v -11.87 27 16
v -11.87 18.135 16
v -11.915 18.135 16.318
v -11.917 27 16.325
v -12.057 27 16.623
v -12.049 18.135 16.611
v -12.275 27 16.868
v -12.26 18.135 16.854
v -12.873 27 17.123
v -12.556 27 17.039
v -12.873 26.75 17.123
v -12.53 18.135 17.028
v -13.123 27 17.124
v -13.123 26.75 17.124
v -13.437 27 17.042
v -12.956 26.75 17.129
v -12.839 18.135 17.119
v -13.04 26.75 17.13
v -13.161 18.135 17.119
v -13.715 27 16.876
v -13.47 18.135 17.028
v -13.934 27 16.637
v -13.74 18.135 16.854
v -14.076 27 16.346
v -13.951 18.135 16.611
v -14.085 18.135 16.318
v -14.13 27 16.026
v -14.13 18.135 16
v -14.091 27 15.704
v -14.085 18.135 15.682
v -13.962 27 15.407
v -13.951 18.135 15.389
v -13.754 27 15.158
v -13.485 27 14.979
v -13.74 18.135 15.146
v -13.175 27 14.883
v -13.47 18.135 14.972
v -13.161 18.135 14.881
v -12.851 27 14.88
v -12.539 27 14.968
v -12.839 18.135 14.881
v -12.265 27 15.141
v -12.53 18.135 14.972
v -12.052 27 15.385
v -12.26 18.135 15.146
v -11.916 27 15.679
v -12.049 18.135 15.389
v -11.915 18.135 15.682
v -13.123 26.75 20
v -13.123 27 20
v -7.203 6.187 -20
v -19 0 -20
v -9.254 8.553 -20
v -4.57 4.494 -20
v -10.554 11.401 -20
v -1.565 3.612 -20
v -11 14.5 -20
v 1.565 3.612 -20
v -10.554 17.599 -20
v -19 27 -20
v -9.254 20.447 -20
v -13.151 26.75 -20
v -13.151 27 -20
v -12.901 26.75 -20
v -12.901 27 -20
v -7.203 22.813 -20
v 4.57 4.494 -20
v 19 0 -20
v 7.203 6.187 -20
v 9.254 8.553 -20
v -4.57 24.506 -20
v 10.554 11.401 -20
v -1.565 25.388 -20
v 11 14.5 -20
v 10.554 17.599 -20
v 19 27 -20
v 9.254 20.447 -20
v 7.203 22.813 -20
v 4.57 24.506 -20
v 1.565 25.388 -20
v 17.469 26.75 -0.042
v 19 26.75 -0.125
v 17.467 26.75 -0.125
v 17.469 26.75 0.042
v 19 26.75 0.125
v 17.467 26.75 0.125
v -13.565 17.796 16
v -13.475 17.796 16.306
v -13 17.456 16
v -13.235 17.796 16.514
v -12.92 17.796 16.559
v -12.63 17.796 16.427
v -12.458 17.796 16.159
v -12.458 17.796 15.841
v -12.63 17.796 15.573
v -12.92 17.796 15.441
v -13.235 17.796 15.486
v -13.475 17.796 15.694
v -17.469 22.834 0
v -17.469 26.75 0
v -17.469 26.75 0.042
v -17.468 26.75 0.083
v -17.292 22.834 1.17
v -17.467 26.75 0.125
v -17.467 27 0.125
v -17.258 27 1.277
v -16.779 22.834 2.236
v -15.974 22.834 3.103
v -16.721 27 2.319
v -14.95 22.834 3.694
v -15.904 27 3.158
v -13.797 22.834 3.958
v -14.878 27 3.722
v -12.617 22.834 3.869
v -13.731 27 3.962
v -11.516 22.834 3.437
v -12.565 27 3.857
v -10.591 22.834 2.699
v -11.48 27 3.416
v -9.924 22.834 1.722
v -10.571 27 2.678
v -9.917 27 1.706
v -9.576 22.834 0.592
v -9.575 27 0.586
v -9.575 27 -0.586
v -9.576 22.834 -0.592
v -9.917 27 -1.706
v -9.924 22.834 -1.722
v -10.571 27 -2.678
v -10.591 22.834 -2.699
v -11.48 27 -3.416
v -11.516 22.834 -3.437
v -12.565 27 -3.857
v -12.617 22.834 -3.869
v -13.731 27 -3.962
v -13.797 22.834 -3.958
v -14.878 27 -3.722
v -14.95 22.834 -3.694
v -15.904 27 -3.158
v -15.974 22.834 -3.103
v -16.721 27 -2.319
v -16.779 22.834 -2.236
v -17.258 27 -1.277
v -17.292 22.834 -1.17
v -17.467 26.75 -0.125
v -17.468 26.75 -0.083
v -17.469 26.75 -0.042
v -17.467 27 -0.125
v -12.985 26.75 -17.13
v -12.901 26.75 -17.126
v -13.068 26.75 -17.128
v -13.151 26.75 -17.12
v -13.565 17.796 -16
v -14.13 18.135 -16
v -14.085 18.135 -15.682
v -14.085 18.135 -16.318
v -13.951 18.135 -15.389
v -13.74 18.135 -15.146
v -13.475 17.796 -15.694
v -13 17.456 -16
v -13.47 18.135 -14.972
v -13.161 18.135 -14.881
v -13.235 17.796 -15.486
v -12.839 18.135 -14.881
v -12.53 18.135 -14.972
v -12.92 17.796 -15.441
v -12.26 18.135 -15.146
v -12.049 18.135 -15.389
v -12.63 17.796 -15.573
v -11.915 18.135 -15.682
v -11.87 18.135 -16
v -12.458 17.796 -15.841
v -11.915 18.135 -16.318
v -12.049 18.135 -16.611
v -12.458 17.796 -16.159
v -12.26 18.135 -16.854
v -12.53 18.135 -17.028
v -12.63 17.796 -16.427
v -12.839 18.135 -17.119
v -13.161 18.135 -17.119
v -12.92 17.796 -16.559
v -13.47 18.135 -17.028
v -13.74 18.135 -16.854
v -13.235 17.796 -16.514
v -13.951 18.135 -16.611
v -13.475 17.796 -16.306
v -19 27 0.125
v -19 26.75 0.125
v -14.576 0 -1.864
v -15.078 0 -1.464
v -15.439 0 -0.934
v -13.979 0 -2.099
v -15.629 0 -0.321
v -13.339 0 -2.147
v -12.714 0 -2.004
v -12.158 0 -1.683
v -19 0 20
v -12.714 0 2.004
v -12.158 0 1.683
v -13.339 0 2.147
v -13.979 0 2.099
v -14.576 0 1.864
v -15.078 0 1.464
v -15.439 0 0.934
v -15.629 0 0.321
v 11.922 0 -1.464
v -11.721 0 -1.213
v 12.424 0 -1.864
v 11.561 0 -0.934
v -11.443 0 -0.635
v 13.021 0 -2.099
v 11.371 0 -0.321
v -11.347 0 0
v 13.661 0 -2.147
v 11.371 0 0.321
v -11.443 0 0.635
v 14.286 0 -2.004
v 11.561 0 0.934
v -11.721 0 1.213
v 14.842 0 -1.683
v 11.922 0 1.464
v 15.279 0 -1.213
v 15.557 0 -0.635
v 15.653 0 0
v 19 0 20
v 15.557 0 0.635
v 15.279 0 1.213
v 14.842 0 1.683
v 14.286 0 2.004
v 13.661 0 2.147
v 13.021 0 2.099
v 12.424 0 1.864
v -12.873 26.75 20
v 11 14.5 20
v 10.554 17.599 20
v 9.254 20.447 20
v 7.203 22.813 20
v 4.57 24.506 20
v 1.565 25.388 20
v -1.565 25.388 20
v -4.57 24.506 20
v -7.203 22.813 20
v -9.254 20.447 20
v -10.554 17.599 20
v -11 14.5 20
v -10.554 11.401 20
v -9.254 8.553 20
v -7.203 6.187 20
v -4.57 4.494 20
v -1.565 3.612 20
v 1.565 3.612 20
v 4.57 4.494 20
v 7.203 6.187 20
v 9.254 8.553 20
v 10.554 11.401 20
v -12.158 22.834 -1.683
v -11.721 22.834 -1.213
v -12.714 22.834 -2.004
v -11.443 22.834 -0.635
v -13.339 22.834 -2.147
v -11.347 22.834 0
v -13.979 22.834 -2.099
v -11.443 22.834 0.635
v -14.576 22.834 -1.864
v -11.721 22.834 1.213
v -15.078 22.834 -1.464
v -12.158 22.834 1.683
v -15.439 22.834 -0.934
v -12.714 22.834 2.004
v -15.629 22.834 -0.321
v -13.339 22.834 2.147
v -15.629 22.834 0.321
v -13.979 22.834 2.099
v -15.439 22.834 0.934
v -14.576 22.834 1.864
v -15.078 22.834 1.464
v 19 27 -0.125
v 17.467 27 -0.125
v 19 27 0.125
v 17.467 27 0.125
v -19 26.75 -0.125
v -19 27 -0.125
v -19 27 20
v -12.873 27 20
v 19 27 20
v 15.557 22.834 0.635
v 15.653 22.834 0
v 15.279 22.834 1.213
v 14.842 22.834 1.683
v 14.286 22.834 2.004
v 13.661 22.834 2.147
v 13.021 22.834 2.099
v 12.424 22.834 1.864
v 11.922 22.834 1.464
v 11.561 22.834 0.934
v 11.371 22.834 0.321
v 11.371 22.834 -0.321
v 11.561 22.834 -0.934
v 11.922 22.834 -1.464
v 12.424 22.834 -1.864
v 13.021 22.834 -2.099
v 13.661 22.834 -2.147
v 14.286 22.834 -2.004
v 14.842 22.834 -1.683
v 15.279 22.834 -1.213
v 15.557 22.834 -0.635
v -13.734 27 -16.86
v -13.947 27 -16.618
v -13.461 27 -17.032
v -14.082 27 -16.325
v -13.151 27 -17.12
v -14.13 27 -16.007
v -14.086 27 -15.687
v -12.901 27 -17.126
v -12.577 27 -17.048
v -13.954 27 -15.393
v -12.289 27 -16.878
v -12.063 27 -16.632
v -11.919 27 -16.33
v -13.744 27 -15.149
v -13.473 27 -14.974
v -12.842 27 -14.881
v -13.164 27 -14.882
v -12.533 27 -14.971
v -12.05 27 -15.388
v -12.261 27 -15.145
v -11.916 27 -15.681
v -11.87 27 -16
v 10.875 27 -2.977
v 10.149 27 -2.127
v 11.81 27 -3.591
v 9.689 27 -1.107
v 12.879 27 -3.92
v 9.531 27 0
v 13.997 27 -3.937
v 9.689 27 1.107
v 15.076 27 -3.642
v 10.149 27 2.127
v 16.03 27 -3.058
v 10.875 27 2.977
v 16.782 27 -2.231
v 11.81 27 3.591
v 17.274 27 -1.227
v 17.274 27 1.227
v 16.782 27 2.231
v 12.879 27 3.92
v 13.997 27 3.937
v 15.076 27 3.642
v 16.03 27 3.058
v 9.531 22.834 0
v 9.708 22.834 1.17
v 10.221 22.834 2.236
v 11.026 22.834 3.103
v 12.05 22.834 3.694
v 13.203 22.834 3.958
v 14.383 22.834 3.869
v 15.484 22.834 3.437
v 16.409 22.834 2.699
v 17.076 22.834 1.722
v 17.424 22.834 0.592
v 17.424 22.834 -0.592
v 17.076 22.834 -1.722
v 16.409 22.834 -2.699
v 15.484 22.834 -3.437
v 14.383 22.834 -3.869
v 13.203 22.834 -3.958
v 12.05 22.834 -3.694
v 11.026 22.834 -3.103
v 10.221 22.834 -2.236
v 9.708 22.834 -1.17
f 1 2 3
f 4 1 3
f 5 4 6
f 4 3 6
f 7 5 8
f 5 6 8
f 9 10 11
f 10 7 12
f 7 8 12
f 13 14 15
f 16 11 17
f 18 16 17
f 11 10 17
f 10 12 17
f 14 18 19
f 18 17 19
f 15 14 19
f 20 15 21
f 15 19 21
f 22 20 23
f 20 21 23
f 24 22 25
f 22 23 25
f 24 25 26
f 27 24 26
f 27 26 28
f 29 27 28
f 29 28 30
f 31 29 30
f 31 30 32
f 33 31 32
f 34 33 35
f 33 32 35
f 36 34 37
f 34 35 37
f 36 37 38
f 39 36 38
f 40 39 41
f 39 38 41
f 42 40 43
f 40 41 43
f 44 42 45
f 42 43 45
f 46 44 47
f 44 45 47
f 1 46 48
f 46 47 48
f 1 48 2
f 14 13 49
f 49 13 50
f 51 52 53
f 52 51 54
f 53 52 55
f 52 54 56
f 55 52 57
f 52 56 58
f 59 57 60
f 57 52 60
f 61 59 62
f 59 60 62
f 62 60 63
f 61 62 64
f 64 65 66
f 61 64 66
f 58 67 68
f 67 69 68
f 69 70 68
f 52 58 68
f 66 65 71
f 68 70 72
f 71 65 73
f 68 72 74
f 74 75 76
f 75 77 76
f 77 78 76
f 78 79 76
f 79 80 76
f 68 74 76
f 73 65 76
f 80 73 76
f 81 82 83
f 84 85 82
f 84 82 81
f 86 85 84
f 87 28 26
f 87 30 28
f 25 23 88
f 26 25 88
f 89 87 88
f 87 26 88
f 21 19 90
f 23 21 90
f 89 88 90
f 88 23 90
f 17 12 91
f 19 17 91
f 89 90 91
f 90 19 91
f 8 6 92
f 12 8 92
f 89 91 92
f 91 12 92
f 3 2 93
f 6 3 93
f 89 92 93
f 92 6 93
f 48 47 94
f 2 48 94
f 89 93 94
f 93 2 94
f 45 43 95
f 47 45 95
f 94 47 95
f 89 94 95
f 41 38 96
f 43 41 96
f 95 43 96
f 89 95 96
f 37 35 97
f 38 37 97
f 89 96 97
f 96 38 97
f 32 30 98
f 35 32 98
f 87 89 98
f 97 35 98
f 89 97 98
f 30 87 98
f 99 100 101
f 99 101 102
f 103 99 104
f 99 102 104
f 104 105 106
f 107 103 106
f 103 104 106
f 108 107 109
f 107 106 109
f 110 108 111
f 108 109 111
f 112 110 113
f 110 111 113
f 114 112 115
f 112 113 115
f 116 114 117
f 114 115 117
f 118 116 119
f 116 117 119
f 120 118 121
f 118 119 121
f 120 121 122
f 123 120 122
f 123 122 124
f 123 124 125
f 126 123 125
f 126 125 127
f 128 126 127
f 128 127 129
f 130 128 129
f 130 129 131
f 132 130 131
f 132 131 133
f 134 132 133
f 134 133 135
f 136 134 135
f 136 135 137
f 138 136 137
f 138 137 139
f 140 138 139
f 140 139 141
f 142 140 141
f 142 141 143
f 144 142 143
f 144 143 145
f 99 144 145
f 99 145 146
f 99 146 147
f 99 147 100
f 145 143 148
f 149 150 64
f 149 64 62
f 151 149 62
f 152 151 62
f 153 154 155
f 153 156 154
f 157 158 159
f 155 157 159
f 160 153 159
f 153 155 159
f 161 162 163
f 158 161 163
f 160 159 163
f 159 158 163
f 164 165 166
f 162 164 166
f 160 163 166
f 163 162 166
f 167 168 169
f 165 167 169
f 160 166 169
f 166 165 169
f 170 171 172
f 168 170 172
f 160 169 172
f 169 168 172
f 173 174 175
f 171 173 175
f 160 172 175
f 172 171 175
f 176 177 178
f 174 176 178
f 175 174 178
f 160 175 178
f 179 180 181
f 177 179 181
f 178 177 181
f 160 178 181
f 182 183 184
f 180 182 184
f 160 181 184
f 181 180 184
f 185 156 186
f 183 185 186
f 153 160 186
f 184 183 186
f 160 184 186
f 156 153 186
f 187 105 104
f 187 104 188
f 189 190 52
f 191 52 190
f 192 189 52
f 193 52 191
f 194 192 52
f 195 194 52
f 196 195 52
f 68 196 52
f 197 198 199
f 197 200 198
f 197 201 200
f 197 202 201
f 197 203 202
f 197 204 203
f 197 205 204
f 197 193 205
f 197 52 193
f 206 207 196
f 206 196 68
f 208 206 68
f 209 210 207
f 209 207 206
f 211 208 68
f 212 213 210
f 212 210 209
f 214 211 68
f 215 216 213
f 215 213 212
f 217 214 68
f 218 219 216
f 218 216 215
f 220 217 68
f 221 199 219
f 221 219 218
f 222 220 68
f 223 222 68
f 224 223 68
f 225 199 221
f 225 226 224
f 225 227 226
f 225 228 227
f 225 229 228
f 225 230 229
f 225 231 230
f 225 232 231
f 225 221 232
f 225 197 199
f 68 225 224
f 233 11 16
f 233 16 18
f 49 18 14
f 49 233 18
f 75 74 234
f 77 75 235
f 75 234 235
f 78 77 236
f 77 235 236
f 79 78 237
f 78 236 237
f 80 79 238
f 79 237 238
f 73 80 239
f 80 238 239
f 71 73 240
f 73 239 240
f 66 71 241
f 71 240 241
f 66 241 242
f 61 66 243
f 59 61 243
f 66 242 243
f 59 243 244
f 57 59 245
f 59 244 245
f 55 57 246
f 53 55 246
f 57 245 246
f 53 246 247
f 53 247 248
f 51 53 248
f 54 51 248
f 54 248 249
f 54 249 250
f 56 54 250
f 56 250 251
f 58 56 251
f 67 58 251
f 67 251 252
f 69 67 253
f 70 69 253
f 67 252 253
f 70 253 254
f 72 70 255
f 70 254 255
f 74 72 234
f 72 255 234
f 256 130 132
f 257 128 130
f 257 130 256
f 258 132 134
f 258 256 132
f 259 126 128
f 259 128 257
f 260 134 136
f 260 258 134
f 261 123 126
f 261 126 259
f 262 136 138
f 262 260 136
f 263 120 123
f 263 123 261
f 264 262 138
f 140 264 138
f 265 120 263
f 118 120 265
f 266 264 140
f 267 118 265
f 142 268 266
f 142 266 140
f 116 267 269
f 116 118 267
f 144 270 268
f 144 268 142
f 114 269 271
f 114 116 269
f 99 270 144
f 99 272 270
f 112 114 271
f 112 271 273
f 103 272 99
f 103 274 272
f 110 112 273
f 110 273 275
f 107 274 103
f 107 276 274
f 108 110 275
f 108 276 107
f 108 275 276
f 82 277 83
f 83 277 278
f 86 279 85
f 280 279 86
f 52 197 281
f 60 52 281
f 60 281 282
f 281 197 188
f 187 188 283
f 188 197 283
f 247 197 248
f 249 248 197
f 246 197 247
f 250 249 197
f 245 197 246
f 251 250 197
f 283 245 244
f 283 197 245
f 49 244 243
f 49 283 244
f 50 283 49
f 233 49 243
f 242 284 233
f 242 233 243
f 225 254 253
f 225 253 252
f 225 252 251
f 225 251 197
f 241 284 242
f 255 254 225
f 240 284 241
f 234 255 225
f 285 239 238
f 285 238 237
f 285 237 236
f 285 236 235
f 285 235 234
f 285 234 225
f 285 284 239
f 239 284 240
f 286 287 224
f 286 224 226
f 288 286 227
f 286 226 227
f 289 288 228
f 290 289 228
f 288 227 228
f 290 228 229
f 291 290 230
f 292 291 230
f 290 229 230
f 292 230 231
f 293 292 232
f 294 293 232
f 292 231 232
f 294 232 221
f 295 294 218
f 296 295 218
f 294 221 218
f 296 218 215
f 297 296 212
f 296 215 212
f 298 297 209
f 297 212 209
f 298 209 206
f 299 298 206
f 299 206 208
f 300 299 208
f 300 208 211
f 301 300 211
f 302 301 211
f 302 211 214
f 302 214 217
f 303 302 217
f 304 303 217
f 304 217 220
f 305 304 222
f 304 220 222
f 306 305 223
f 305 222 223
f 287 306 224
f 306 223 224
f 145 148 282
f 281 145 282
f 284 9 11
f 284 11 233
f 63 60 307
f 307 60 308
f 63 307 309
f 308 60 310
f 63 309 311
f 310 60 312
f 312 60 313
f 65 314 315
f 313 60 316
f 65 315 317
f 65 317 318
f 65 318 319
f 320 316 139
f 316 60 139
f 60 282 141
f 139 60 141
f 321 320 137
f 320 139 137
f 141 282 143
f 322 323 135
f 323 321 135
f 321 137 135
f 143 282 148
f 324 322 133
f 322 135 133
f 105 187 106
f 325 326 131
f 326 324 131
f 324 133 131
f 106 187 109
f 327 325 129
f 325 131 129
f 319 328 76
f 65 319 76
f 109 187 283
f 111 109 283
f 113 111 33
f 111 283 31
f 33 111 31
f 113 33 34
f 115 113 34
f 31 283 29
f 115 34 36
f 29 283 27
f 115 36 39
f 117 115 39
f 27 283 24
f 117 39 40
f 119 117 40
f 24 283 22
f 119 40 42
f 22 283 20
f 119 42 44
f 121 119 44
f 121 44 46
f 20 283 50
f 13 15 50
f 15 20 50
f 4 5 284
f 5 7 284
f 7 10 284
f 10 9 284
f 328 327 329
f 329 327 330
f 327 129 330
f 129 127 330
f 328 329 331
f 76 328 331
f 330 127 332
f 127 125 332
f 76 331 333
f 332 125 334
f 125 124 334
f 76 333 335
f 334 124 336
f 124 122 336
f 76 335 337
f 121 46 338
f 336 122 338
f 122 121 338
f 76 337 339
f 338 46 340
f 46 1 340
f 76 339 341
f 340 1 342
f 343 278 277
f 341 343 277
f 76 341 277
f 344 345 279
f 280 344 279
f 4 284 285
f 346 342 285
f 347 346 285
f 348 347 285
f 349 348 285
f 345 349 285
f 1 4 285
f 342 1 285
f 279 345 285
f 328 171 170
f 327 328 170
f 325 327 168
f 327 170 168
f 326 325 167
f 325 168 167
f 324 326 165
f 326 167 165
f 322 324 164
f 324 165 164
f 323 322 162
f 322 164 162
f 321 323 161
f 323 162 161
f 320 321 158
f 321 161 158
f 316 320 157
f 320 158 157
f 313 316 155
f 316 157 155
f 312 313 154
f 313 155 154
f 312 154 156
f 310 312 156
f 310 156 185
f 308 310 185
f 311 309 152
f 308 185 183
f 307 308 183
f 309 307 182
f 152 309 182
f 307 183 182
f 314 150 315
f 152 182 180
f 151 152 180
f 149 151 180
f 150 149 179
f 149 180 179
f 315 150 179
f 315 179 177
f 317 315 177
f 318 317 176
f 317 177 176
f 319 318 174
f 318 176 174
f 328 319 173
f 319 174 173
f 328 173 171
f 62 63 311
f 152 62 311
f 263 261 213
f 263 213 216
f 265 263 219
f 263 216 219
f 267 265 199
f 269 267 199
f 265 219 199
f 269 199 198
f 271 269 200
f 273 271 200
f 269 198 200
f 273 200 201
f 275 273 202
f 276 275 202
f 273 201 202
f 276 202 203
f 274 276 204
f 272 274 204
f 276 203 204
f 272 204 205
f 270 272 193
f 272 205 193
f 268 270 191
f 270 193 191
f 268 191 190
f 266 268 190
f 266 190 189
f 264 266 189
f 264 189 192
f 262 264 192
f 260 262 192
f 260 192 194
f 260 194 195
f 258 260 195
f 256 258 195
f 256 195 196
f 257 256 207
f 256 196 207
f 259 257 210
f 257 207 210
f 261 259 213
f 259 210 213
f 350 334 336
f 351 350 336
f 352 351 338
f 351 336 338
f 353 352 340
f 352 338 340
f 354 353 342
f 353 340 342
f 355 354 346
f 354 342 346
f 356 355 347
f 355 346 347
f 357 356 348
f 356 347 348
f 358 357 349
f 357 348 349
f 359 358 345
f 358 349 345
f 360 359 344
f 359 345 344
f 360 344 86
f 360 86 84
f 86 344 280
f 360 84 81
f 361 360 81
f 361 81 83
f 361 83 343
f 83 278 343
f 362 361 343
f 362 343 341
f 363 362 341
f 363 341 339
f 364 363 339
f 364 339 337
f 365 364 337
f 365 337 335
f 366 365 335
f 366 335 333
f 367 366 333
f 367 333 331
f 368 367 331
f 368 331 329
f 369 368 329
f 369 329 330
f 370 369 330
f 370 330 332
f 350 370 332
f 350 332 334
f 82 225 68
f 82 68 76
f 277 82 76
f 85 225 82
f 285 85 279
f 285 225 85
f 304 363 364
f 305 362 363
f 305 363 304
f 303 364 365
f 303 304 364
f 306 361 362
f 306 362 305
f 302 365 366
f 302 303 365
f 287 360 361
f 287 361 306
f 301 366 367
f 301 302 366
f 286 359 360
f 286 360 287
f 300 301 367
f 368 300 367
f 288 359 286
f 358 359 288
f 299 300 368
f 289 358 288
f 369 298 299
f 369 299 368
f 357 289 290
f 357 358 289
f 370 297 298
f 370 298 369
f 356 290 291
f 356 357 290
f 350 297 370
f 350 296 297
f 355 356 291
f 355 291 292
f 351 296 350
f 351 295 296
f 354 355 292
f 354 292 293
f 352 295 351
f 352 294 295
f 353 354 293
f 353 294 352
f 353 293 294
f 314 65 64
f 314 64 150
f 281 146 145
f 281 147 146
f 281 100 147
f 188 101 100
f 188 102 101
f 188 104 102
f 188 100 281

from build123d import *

# Parameters (mm, degrees)
SKETCH1_W                                      = 38
SKETCH1_H                                      = 27
EXTRUDE1_DEPTH                                 = 20
SKETCH2_R                                      = 11
LIGHT_WEIGHTING_HOLE_DEPTH                     = 21
LIGHT_WEIGHTING_HOLE_DEPTH_BACK                = 21
F_4_40_TAPPED_HOLE1_D                          = 2.2606
F_4_40_TAPPED_HOLE1_DEPTH                      = 8.8646
F_4_40_TAPPED_HOLE1_TIP                        = 0.679152758
CBORE_FOR_8_SOCKET_HEAD_CAP_SCREW1_D           = 4.3053
CBORE_FOR_8_SOCKET_HEAD_CAP_SCREW1_CBORE_D     = 7.9375
CBORE_FOR_8_SOCKET_HEAD_CAP_SCREW1_CBORE_DEPTH = 4.1656
SKETCH9_W                                      = 0.25
SKETCH9_H                                      = 4
SKETCH9_W_2                                    = 2.002359623
SKETCH9_H_2                                    = 0.25
SKETCH9_W_3                                    = 2.12486514
CUT_EXTRUDE1_DEPTH                             = 0.25


with BuildPart() as part:
    # Sketch1 → Extrude1 (new body, symmetric)
    with BuildSketch(Plane.XY):
        with Locations((0, 13.5)):
            Rectangle(SKETCH1_W, SKETCH1_H)
    extrude(amount=EXTRUDE1_DEPTH, both=True)

    # Sketch2 → Light-Weighting Hole (cut, two sides)
    with BuildSketch(Plane.XY) as light_weighting_hole_sk:
        with Locations((0, 14.5)):
            Circle(SKETCH2_R)
    extrude(amount=LIGHT_WEIGHTING_HOLE_DEPTH, mode=Mode.SUBTRACT)
    extrude(light_weighting_hole_sk.sketch, amount=-LIGHT_WEIGHTING_HOLE_DEPTH_BACK, mode=Mode.SUBTRACT)

    # #4-40 Tapped Hole1
    with Locations(Plane(origin=(0, 27, 0), x_dir=(-1, 0, 0), z_dir=(0, 1, 0))):
        with Locations((13, -16), (13, 16)):
            Hole(F_4_40_TAPPED_HOLE1_D / 2, depth=F_4_40_TAPPED_HOLE1_DEPTH)
            with Locations((0, 0, -(F_4_40_TAPPED_HOLE1_DEPTH + F_4_40_TAPPED_HOLE1_TIP / 2))):  # 118° drill point
                Cone(0, F_4_40_TAPPED_HOLE1_D / 2, F_4_40_TAPPED_HOLE1_TIP, mode=Mode.SUBTRACT)

    # CBORE for #8 Socket Head Cap Screw1 (through all)
    with Locations(Plane(origin=(0, 27, 0), x_dir=(-1, 0, 0), z_dir=(0, 1, 0))):
        with Locations((13.5, 0), (-13.5, 0)):
            CounterBoreHole(CBORE_FOR_8_SOCKET_HEAD_CAP_SCREW1_D / 2, CBORE_FOR_8_SOCKET_HEAD_CAP_SCREW1_CBORE_D / 2, CBORE_FOR_8_SOCKET_HEAD_CAP_SCREW1_CBORE_DEPTH)

    # Sketch9 → Cut-Extrude1 (cut)
    with BuildSketch(Plane(origin=(0, 27, 0), x_dir=(-1, 0, 0), z_dir=(0, 1, 0))):
        with Locations((13.026450264, -18)):
            Rectangle(SKETCH9_W, SKETCH9_H)
        with Locations((12.998090527, 18)):
            Rectangle(SKETCH9_W, SKETCH9_H)
        with Locations((-17.998820188, 0)):
            Rectangle(SKETCH9_W_2, SKETCH9_H_2)
        with Locations((17.93756743, 0)):
            Rectangle(SKETCH9_W_3, SKETCH9_H_2)
    extrude(amount=-CUT_EXTRUDE1_DEPTH, mode=Mode.SUBTRACT)


solid = part.part
